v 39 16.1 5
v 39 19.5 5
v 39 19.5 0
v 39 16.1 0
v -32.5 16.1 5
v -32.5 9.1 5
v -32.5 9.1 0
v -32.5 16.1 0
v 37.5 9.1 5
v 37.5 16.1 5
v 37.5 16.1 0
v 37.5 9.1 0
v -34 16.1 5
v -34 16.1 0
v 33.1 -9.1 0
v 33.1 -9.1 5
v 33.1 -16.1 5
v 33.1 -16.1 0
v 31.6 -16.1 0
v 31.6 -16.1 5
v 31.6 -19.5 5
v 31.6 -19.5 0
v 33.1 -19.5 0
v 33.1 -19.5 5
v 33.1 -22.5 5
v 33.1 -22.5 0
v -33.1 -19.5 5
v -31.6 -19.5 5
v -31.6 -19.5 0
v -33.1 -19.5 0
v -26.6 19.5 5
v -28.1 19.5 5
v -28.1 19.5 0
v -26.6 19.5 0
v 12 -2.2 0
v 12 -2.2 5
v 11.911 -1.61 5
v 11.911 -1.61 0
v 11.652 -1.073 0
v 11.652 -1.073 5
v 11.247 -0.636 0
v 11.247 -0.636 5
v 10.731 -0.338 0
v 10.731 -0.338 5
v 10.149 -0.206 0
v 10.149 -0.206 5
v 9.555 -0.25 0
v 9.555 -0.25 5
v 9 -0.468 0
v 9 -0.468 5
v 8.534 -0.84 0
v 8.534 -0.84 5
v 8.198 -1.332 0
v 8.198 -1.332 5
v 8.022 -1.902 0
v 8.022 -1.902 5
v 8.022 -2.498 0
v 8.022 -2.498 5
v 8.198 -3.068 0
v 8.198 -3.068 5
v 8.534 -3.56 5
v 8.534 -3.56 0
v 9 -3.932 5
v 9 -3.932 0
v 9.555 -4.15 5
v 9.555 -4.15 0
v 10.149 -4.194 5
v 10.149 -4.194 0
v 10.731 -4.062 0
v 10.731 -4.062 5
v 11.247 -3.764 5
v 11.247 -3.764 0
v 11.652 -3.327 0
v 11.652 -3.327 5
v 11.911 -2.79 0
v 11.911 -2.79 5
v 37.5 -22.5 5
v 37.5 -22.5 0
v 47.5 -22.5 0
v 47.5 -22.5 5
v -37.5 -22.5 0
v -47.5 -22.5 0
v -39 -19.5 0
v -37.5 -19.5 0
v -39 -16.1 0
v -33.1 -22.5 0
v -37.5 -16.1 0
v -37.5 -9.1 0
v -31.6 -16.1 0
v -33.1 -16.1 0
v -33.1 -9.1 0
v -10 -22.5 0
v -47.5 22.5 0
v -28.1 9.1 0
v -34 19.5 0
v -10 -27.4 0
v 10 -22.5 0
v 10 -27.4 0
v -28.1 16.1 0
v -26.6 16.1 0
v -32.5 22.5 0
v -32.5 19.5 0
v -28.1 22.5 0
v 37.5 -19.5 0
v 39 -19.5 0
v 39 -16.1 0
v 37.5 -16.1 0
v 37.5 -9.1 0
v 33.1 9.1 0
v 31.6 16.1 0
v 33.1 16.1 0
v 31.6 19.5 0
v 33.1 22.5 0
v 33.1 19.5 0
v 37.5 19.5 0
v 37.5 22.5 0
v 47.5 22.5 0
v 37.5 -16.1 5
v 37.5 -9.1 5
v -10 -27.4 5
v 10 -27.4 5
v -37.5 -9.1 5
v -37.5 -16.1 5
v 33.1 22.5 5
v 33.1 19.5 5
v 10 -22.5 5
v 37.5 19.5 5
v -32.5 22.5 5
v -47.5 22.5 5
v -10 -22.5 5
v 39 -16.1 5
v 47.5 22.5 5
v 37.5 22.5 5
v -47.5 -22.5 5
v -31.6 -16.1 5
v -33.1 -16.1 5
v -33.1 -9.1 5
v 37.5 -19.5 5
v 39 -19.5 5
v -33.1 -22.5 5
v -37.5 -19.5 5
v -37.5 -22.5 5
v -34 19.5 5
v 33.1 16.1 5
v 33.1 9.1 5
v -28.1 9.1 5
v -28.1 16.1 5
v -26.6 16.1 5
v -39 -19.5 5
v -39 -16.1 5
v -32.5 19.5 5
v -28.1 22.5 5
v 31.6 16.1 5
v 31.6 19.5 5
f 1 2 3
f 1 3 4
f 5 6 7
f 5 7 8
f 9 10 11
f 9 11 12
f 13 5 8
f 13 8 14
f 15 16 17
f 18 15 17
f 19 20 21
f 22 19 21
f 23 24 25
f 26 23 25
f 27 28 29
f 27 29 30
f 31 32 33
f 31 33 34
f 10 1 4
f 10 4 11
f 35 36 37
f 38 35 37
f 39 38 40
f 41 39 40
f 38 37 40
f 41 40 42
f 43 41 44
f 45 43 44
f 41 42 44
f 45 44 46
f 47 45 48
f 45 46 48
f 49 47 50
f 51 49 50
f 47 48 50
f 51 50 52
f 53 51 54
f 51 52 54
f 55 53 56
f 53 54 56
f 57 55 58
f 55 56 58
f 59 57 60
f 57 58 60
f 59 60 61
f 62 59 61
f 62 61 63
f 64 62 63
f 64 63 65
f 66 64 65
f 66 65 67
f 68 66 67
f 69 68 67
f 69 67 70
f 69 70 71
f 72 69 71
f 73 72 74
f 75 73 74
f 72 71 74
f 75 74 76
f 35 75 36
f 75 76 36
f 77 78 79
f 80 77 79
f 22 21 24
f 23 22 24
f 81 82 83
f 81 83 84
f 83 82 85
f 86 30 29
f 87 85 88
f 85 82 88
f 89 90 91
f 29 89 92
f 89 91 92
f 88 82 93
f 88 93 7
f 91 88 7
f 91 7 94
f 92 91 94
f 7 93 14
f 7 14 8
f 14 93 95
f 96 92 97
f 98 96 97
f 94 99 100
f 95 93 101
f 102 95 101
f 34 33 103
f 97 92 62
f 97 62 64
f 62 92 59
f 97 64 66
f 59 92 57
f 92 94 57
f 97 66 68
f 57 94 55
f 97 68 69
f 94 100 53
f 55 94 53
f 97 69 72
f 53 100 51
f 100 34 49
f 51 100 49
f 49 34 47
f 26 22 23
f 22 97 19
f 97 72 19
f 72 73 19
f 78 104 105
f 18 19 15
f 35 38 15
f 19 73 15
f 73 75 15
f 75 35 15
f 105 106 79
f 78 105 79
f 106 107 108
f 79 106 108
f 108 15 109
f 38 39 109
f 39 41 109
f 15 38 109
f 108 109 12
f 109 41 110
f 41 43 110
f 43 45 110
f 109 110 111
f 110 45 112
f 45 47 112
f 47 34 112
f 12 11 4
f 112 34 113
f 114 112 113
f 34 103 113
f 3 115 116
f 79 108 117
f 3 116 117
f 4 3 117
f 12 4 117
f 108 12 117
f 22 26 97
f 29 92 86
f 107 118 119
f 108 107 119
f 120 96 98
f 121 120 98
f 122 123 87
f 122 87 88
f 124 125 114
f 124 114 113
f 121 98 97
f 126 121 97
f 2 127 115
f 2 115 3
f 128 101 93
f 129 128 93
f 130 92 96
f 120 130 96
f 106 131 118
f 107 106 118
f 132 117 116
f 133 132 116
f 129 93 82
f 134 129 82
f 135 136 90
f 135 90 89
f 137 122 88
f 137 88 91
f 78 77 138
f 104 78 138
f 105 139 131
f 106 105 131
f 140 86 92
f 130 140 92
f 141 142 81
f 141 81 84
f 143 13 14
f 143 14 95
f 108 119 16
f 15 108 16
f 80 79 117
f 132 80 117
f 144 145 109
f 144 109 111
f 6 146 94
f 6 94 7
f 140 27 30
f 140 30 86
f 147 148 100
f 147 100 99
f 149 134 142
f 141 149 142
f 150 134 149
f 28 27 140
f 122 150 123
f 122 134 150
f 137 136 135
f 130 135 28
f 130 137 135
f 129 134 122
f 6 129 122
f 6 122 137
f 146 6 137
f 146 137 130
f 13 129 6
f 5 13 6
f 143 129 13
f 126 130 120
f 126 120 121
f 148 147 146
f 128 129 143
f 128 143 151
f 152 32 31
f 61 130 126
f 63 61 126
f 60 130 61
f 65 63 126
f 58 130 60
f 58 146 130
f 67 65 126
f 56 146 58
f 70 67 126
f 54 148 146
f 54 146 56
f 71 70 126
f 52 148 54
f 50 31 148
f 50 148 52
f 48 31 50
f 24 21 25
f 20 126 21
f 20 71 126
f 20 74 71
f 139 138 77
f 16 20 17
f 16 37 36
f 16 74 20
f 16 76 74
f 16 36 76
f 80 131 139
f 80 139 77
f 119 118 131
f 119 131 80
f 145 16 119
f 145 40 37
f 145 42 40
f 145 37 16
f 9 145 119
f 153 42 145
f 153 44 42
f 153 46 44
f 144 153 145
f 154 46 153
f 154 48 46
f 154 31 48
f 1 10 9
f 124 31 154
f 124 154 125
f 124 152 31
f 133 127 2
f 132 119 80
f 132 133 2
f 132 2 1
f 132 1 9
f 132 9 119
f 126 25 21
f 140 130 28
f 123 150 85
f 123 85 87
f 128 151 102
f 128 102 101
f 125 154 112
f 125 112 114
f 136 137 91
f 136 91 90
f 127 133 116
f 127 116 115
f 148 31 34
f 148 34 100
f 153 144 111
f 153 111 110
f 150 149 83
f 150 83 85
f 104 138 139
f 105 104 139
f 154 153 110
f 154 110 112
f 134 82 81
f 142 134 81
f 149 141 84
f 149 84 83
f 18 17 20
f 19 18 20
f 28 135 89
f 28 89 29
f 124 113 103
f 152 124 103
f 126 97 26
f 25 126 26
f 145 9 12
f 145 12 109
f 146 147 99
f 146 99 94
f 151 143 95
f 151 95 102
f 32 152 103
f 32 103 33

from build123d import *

# Parameters (mm, degrees)
BOSS_EXTRUDE1_DEPTH = 5
CUT_EXTRUDE1_DEPTH  = 5
SKETCH4_R           = 2
CUT_EXTRUDE2_DEPTH  = 5


with BuildPart() as part:
    # Sketch1 → Boss-Extrude1 (new body)
    with BuildSketch(Plane.XY):
        Polygon((10, -22.5), (47.5, -22.5), (47.5, 22.5), (-47.5, 22.5), (-47.5, -22.5), (-10, -22.5), (-10, -27.4), (10, -27.4), align=None)
    extrude(amount=BOSS_EXTRUDE1_DEPTH)

    # Sketch3 → Cut-Extrude1 (cut)
    with BuildSketch(Plane.XY.offset(5)):
        Polygon((-33.1, -19.5), (-33.1, -22.5), (-37.5, -22.5), (-37.5, -19.5), (-39, -19.5), (-39, -16.1), (-37.5, -16.1), (-37.5, -9.1), (-33.1, -9.1), (-33.1, -16.1), (-31.6, -16.1), (-31.6, -19.5), align=None)
        Polygon((37.5, -22.5), (37.5, -19.5), (39, -19.5), (39, -16.1), (37.5, -16.1), (37.5, -9.1), (33.1, -9.1), (33.1, -16.1), (31.6, -16.1), (31.6, -19.5), (33.1, -19.5), (33.1, -22.5), align=None)
        Polygon((33.1, 19.5), (33.1, 22.5), (37.5, 22.5), (37.5, 19.5), (39, 19.5), (39, 16.1), (37.5, 16.1), (37.5, 9.1), (33.1, 9.1), (33.1, 16.1), (31.6, 16.1), (31.6, 19.5), align=None)
        Polygon((-32.5, 19.5), (-32.5, 22.5), (-28.1, 22.5), (-28.1, 19.5), (-26.6, 19.5), (-26.6, 16.1), (-28.1, 16.1), (-28.1, 9.1), (-32.5, 9.1), (-32.5, 16.1), (-34, 16.1), (-34, 19.5), align=None)
    extrude(amount=-CUT_EXTRUDE1_DEPTH, mode=Mode.SUBTRACT)

    # Sketch4 → Cut-Extrude2 (cut)
    with BuildSketch(Plane.XY.offset(5)):
        with Locations((10, -2.2)):
            Circle(SKETCH4_R)
    extrude(amount=-CUT_EXTRUDE2_DEPTH, mode=Mode.SUBTRACT)


solid = part.part
